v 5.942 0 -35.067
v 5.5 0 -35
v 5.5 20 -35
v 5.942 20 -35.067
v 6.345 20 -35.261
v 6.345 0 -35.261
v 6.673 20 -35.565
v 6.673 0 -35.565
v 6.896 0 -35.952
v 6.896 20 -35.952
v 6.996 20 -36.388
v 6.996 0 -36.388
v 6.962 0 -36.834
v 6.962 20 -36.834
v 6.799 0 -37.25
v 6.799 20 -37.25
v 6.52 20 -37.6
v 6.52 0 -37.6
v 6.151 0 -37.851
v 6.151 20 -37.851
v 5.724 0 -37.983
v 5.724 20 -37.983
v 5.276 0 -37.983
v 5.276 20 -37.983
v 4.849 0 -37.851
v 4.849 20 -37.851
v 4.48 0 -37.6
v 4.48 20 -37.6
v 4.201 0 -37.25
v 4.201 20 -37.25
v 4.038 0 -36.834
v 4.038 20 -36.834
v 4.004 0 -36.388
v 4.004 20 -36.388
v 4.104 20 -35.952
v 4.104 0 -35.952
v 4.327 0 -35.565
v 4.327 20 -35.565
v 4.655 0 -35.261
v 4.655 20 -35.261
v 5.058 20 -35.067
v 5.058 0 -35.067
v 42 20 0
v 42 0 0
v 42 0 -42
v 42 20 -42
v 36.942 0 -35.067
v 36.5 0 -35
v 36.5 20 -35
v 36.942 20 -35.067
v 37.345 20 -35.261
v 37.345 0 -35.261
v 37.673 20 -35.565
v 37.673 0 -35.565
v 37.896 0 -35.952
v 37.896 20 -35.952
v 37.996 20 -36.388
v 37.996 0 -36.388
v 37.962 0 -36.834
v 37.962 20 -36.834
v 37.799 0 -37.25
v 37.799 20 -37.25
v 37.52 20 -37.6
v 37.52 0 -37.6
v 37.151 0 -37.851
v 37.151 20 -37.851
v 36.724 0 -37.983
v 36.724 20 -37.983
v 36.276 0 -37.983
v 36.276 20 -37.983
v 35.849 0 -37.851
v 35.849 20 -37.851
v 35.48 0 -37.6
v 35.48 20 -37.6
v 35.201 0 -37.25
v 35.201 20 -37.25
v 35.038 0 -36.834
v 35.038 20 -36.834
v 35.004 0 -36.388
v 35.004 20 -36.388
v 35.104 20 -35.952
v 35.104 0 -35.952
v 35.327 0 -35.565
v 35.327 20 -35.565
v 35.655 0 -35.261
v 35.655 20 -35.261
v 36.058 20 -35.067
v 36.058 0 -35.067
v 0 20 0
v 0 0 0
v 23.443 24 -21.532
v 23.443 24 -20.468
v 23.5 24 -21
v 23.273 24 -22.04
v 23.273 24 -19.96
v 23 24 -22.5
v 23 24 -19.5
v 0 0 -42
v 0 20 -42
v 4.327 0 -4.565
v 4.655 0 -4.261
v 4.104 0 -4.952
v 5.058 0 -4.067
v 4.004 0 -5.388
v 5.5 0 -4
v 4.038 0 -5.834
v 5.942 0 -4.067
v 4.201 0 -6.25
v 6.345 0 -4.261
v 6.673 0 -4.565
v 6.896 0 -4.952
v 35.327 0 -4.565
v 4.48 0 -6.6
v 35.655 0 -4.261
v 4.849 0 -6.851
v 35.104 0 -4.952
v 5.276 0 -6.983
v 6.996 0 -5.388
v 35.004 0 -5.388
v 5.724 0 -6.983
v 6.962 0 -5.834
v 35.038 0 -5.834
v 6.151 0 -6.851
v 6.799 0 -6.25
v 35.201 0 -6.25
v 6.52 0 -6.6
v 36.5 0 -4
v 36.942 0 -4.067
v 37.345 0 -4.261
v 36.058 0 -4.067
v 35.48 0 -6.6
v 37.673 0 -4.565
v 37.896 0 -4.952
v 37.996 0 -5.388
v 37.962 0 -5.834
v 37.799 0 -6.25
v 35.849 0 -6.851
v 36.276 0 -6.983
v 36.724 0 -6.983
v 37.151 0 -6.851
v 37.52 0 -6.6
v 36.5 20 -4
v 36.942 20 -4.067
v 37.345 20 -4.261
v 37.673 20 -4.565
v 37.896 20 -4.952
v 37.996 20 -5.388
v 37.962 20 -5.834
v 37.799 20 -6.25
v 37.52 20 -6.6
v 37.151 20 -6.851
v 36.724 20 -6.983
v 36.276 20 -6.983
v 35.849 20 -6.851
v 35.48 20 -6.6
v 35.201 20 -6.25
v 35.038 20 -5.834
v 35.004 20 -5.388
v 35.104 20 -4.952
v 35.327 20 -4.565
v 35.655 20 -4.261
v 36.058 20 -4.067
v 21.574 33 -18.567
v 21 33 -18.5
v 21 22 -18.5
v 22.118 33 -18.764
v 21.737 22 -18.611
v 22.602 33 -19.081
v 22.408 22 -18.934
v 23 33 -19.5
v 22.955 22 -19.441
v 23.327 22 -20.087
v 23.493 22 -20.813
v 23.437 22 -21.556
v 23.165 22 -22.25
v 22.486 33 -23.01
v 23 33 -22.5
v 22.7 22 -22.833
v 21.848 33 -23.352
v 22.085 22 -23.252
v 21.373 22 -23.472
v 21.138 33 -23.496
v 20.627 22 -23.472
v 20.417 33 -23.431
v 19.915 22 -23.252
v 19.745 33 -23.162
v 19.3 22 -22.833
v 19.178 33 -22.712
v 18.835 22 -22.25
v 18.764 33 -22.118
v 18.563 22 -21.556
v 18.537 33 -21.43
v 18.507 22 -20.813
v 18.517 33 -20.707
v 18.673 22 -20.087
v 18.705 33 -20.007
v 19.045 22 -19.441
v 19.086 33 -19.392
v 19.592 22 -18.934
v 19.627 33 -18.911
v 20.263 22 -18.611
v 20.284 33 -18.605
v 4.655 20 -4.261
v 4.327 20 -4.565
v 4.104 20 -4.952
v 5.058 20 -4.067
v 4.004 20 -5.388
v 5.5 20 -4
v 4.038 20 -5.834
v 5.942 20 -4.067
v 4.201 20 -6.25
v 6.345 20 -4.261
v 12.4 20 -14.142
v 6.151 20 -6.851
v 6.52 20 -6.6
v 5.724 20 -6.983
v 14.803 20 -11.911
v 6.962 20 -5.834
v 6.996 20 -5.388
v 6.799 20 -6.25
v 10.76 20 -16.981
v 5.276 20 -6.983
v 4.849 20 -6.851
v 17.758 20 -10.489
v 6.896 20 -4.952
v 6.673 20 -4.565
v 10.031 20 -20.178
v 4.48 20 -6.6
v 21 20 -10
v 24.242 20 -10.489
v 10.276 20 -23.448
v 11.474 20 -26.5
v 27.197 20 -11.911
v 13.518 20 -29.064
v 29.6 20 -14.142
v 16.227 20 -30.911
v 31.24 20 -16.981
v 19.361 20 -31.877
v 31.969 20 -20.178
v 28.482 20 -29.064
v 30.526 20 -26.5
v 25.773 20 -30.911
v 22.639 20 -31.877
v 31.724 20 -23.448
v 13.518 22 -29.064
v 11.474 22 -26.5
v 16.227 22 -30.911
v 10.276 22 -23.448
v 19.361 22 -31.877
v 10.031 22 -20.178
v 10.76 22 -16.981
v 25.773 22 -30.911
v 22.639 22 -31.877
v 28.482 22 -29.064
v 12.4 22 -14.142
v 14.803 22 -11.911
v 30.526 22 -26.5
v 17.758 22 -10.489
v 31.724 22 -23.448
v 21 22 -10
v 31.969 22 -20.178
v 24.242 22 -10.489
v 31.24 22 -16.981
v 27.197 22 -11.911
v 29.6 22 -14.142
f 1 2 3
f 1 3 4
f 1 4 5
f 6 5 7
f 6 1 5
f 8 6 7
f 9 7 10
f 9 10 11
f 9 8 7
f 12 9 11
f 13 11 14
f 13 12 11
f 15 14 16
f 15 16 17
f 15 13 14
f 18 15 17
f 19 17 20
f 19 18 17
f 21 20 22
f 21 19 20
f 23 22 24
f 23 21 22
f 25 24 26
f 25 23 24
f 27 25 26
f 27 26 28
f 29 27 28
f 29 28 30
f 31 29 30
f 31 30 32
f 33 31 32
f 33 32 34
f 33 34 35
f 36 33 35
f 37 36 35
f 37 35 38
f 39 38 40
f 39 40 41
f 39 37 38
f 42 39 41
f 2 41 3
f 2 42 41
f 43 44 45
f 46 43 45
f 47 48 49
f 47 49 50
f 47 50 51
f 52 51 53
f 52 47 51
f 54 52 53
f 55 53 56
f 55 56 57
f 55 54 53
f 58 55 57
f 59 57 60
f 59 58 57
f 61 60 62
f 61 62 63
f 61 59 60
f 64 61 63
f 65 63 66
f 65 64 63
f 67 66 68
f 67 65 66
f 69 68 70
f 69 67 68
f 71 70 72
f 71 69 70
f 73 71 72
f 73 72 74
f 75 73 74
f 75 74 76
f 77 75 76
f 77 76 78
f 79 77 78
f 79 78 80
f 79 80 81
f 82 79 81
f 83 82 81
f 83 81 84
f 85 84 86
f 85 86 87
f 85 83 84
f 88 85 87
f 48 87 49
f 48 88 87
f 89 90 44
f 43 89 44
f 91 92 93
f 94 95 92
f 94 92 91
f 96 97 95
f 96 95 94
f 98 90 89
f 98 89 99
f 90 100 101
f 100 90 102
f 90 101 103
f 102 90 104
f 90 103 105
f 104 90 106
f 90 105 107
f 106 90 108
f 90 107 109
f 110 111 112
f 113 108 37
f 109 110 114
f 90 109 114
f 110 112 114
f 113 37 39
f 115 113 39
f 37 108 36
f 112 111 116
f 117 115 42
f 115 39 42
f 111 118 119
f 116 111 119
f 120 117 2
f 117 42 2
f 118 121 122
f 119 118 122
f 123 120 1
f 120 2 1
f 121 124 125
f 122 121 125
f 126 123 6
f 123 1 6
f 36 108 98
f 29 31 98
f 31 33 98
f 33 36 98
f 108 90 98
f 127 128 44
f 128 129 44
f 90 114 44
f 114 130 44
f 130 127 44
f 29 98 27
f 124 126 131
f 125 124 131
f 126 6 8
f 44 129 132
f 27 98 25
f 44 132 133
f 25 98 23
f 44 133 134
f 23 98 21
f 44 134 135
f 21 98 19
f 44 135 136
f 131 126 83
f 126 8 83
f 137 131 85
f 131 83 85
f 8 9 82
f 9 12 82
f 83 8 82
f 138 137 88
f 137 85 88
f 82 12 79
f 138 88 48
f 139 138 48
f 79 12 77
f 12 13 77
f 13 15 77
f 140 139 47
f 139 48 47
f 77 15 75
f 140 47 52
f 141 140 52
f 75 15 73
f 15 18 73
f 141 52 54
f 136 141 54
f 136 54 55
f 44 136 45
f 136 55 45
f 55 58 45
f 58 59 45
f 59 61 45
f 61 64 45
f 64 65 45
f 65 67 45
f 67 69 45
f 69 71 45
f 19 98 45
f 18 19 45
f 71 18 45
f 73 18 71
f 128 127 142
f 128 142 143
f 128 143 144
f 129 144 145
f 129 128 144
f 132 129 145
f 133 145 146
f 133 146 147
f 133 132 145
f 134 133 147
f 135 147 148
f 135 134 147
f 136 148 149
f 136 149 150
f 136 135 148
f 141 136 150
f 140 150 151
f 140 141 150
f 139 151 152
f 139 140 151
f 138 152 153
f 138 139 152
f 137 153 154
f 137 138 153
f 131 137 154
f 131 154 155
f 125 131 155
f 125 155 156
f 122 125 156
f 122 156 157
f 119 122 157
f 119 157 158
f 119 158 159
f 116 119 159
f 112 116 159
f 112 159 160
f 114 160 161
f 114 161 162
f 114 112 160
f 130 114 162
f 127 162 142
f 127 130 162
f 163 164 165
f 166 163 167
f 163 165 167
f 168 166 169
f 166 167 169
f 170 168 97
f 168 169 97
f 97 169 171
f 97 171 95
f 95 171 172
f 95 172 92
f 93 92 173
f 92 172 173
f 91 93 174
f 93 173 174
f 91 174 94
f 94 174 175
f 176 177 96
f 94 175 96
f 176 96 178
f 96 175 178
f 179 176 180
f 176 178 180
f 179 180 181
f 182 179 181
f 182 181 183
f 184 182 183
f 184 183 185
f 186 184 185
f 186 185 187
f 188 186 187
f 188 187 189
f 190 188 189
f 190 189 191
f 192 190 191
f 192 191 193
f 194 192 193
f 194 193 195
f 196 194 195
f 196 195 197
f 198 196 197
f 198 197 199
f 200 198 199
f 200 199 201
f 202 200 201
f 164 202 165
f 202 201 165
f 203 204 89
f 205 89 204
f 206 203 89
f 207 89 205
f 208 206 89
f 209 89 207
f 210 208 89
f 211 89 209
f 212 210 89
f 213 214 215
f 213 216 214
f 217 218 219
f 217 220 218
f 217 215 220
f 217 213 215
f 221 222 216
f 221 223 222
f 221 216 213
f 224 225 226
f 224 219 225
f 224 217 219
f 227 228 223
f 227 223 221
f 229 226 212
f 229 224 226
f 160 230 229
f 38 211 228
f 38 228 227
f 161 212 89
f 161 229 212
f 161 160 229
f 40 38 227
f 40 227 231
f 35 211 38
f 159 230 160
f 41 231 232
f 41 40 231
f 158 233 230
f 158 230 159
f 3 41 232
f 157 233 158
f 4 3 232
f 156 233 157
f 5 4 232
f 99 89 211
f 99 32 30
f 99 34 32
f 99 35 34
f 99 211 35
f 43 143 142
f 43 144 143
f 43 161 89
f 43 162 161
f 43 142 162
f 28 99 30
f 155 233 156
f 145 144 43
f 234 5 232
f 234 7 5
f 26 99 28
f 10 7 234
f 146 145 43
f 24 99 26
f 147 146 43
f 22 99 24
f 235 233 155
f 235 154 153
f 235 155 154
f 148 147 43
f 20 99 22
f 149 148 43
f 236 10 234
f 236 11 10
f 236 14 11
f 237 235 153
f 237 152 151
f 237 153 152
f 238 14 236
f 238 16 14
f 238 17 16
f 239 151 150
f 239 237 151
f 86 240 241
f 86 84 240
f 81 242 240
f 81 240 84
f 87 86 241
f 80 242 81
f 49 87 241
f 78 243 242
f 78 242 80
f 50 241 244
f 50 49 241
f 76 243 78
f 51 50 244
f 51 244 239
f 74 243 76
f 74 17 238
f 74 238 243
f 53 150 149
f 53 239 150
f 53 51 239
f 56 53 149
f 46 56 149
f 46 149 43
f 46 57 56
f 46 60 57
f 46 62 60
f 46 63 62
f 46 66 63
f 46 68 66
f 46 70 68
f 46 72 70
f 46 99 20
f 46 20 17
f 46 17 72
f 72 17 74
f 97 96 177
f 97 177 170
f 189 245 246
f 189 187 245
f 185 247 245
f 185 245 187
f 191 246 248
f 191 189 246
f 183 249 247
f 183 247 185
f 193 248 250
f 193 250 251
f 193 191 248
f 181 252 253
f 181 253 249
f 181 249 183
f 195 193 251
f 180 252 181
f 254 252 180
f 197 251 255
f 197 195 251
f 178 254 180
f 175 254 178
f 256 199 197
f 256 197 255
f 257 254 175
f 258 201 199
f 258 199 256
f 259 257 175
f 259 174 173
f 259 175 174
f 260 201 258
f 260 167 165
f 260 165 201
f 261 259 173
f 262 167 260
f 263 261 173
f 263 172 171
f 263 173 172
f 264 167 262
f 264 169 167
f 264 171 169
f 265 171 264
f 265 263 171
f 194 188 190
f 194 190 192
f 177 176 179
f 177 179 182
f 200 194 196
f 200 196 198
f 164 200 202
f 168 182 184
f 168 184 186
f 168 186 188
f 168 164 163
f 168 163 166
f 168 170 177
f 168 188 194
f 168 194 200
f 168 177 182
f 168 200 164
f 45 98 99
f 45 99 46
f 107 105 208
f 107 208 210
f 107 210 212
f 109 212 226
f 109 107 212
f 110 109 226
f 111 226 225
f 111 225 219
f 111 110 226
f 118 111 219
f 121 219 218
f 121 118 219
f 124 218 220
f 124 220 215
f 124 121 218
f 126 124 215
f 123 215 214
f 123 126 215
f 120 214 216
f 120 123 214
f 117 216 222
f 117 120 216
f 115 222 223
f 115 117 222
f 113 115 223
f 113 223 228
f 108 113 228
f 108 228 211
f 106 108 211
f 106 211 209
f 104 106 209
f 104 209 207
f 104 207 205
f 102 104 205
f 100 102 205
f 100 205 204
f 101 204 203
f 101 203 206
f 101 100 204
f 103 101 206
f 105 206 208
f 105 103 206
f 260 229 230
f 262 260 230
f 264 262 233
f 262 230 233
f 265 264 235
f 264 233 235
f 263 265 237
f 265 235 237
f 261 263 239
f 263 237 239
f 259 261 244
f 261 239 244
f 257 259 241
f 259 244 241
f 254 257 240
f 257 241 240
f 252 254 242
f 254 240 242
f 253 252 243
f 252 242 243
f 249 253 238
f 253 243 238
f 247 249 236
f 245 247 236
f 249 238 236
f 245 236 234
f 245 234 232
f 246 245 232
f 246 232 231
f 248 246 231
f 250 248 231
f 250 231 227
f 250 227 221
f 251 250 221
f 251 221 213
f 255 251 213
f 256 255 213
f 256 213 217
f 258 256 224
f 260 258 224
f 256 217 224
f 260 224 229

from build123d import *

# Parameters (mm, degrees)
SKETCH_1_W          = 42
SKETCH_1_H          = 42
SKETCH_1_R          = 1.5
EXTRUDE_1_DEPTH     = 20
SKETCH_2_R          = 11
EXTRUDE_2_DEPTH     = 2
SKETCH_3_R          = 2.5
EXTRUDE_3_DEPTH     = 11
CUT_EXTRUDE_START   = -9
CUT_EXTRUDE_1_DEPTH = 9


with BuildPart() as part:
    # 草图1 → 凸台-拉伸1 (new body)
    with BuildSketch(Plane(origin=(0, 0, 0), x_dir=(1, 0, 0), z_dir=(0, 1, 0))):
        with Locations((21, 21)):
            Rectangle(SKETCH_1_W, SKETCH_1_H)
        with Locations(Location((5.5, 5.5, 0), (0, 0, 270))):
            Circle(SKETCH_1_R, mode=Mode.SUBTRACT)
        with Locations(Location((36.5, 5.5, 0), (0, 0, 270))):
            Circle(SKETCH_1_R, mode=Mode.SUBTRACT)
        with Locations(Location((36.5, 36.5, 0), (0, 0, 270))):
            Circle(SKETCH_1_R, mode=Mode.SUBTRACT)
        with Locations(Location((5.5, 36.5, 0), (0, 0, 270))):
            Circle(SKETCH_1_R, mode=Mode.SUBTRACT)
    extrude(amount=EXTRUDE_1_DEPTH)

    # 草图2 → 凸台-拉伸2 (add)
    with BuildSketch(Plane(origin=(0, 20, 0), x_dir=(1, 0, 0), z_dir=(0, 1, 0))):
        with Locations(Location((21, 21, 0), (0, 0, 270))):
            Circle(SKETCH_2_R)
    extrude(amount=EXTRUDE_2_DEPTH)

    # 草图3 → 凸台-拉伸3 (add)
    with BuildSketch(Plane(origin=(0, 22, 0), x_dir=(1, 0, 0), z_dir=(0, 1, 0))):
        with Locations(Location((21, 21, 0), (0, 0, 270))):
            Circle(SKETCH_3_R)
    extrude(amount=EXTRUDE_3_DEPTH)

    # 草图4 → 切除-拉伸1 (cut)
    with BuildSketch(Plane(origin=(0, 33, 0), x_dir=(1, 0, 0), z_dir=(0, 1, 0)).offset(CUT_EXTRUDE_START)):
        with BuildLine():
            Line((23, 22.5), (23, 21))
            Line((23, 21), (23, 19.5))
            ThreePointArc((23, 19.5), (23.371708245, 20.209430585), (23.5, 21))
            ThreePointArc((23.5, 21), (23.371708245, 21.790569415), (23, 22.5))
        make_face()
    extrude(amount=CUT_EXTRUDE_1_DEPTH, mode=Mode.SUBTRACT)


solid = part.part
